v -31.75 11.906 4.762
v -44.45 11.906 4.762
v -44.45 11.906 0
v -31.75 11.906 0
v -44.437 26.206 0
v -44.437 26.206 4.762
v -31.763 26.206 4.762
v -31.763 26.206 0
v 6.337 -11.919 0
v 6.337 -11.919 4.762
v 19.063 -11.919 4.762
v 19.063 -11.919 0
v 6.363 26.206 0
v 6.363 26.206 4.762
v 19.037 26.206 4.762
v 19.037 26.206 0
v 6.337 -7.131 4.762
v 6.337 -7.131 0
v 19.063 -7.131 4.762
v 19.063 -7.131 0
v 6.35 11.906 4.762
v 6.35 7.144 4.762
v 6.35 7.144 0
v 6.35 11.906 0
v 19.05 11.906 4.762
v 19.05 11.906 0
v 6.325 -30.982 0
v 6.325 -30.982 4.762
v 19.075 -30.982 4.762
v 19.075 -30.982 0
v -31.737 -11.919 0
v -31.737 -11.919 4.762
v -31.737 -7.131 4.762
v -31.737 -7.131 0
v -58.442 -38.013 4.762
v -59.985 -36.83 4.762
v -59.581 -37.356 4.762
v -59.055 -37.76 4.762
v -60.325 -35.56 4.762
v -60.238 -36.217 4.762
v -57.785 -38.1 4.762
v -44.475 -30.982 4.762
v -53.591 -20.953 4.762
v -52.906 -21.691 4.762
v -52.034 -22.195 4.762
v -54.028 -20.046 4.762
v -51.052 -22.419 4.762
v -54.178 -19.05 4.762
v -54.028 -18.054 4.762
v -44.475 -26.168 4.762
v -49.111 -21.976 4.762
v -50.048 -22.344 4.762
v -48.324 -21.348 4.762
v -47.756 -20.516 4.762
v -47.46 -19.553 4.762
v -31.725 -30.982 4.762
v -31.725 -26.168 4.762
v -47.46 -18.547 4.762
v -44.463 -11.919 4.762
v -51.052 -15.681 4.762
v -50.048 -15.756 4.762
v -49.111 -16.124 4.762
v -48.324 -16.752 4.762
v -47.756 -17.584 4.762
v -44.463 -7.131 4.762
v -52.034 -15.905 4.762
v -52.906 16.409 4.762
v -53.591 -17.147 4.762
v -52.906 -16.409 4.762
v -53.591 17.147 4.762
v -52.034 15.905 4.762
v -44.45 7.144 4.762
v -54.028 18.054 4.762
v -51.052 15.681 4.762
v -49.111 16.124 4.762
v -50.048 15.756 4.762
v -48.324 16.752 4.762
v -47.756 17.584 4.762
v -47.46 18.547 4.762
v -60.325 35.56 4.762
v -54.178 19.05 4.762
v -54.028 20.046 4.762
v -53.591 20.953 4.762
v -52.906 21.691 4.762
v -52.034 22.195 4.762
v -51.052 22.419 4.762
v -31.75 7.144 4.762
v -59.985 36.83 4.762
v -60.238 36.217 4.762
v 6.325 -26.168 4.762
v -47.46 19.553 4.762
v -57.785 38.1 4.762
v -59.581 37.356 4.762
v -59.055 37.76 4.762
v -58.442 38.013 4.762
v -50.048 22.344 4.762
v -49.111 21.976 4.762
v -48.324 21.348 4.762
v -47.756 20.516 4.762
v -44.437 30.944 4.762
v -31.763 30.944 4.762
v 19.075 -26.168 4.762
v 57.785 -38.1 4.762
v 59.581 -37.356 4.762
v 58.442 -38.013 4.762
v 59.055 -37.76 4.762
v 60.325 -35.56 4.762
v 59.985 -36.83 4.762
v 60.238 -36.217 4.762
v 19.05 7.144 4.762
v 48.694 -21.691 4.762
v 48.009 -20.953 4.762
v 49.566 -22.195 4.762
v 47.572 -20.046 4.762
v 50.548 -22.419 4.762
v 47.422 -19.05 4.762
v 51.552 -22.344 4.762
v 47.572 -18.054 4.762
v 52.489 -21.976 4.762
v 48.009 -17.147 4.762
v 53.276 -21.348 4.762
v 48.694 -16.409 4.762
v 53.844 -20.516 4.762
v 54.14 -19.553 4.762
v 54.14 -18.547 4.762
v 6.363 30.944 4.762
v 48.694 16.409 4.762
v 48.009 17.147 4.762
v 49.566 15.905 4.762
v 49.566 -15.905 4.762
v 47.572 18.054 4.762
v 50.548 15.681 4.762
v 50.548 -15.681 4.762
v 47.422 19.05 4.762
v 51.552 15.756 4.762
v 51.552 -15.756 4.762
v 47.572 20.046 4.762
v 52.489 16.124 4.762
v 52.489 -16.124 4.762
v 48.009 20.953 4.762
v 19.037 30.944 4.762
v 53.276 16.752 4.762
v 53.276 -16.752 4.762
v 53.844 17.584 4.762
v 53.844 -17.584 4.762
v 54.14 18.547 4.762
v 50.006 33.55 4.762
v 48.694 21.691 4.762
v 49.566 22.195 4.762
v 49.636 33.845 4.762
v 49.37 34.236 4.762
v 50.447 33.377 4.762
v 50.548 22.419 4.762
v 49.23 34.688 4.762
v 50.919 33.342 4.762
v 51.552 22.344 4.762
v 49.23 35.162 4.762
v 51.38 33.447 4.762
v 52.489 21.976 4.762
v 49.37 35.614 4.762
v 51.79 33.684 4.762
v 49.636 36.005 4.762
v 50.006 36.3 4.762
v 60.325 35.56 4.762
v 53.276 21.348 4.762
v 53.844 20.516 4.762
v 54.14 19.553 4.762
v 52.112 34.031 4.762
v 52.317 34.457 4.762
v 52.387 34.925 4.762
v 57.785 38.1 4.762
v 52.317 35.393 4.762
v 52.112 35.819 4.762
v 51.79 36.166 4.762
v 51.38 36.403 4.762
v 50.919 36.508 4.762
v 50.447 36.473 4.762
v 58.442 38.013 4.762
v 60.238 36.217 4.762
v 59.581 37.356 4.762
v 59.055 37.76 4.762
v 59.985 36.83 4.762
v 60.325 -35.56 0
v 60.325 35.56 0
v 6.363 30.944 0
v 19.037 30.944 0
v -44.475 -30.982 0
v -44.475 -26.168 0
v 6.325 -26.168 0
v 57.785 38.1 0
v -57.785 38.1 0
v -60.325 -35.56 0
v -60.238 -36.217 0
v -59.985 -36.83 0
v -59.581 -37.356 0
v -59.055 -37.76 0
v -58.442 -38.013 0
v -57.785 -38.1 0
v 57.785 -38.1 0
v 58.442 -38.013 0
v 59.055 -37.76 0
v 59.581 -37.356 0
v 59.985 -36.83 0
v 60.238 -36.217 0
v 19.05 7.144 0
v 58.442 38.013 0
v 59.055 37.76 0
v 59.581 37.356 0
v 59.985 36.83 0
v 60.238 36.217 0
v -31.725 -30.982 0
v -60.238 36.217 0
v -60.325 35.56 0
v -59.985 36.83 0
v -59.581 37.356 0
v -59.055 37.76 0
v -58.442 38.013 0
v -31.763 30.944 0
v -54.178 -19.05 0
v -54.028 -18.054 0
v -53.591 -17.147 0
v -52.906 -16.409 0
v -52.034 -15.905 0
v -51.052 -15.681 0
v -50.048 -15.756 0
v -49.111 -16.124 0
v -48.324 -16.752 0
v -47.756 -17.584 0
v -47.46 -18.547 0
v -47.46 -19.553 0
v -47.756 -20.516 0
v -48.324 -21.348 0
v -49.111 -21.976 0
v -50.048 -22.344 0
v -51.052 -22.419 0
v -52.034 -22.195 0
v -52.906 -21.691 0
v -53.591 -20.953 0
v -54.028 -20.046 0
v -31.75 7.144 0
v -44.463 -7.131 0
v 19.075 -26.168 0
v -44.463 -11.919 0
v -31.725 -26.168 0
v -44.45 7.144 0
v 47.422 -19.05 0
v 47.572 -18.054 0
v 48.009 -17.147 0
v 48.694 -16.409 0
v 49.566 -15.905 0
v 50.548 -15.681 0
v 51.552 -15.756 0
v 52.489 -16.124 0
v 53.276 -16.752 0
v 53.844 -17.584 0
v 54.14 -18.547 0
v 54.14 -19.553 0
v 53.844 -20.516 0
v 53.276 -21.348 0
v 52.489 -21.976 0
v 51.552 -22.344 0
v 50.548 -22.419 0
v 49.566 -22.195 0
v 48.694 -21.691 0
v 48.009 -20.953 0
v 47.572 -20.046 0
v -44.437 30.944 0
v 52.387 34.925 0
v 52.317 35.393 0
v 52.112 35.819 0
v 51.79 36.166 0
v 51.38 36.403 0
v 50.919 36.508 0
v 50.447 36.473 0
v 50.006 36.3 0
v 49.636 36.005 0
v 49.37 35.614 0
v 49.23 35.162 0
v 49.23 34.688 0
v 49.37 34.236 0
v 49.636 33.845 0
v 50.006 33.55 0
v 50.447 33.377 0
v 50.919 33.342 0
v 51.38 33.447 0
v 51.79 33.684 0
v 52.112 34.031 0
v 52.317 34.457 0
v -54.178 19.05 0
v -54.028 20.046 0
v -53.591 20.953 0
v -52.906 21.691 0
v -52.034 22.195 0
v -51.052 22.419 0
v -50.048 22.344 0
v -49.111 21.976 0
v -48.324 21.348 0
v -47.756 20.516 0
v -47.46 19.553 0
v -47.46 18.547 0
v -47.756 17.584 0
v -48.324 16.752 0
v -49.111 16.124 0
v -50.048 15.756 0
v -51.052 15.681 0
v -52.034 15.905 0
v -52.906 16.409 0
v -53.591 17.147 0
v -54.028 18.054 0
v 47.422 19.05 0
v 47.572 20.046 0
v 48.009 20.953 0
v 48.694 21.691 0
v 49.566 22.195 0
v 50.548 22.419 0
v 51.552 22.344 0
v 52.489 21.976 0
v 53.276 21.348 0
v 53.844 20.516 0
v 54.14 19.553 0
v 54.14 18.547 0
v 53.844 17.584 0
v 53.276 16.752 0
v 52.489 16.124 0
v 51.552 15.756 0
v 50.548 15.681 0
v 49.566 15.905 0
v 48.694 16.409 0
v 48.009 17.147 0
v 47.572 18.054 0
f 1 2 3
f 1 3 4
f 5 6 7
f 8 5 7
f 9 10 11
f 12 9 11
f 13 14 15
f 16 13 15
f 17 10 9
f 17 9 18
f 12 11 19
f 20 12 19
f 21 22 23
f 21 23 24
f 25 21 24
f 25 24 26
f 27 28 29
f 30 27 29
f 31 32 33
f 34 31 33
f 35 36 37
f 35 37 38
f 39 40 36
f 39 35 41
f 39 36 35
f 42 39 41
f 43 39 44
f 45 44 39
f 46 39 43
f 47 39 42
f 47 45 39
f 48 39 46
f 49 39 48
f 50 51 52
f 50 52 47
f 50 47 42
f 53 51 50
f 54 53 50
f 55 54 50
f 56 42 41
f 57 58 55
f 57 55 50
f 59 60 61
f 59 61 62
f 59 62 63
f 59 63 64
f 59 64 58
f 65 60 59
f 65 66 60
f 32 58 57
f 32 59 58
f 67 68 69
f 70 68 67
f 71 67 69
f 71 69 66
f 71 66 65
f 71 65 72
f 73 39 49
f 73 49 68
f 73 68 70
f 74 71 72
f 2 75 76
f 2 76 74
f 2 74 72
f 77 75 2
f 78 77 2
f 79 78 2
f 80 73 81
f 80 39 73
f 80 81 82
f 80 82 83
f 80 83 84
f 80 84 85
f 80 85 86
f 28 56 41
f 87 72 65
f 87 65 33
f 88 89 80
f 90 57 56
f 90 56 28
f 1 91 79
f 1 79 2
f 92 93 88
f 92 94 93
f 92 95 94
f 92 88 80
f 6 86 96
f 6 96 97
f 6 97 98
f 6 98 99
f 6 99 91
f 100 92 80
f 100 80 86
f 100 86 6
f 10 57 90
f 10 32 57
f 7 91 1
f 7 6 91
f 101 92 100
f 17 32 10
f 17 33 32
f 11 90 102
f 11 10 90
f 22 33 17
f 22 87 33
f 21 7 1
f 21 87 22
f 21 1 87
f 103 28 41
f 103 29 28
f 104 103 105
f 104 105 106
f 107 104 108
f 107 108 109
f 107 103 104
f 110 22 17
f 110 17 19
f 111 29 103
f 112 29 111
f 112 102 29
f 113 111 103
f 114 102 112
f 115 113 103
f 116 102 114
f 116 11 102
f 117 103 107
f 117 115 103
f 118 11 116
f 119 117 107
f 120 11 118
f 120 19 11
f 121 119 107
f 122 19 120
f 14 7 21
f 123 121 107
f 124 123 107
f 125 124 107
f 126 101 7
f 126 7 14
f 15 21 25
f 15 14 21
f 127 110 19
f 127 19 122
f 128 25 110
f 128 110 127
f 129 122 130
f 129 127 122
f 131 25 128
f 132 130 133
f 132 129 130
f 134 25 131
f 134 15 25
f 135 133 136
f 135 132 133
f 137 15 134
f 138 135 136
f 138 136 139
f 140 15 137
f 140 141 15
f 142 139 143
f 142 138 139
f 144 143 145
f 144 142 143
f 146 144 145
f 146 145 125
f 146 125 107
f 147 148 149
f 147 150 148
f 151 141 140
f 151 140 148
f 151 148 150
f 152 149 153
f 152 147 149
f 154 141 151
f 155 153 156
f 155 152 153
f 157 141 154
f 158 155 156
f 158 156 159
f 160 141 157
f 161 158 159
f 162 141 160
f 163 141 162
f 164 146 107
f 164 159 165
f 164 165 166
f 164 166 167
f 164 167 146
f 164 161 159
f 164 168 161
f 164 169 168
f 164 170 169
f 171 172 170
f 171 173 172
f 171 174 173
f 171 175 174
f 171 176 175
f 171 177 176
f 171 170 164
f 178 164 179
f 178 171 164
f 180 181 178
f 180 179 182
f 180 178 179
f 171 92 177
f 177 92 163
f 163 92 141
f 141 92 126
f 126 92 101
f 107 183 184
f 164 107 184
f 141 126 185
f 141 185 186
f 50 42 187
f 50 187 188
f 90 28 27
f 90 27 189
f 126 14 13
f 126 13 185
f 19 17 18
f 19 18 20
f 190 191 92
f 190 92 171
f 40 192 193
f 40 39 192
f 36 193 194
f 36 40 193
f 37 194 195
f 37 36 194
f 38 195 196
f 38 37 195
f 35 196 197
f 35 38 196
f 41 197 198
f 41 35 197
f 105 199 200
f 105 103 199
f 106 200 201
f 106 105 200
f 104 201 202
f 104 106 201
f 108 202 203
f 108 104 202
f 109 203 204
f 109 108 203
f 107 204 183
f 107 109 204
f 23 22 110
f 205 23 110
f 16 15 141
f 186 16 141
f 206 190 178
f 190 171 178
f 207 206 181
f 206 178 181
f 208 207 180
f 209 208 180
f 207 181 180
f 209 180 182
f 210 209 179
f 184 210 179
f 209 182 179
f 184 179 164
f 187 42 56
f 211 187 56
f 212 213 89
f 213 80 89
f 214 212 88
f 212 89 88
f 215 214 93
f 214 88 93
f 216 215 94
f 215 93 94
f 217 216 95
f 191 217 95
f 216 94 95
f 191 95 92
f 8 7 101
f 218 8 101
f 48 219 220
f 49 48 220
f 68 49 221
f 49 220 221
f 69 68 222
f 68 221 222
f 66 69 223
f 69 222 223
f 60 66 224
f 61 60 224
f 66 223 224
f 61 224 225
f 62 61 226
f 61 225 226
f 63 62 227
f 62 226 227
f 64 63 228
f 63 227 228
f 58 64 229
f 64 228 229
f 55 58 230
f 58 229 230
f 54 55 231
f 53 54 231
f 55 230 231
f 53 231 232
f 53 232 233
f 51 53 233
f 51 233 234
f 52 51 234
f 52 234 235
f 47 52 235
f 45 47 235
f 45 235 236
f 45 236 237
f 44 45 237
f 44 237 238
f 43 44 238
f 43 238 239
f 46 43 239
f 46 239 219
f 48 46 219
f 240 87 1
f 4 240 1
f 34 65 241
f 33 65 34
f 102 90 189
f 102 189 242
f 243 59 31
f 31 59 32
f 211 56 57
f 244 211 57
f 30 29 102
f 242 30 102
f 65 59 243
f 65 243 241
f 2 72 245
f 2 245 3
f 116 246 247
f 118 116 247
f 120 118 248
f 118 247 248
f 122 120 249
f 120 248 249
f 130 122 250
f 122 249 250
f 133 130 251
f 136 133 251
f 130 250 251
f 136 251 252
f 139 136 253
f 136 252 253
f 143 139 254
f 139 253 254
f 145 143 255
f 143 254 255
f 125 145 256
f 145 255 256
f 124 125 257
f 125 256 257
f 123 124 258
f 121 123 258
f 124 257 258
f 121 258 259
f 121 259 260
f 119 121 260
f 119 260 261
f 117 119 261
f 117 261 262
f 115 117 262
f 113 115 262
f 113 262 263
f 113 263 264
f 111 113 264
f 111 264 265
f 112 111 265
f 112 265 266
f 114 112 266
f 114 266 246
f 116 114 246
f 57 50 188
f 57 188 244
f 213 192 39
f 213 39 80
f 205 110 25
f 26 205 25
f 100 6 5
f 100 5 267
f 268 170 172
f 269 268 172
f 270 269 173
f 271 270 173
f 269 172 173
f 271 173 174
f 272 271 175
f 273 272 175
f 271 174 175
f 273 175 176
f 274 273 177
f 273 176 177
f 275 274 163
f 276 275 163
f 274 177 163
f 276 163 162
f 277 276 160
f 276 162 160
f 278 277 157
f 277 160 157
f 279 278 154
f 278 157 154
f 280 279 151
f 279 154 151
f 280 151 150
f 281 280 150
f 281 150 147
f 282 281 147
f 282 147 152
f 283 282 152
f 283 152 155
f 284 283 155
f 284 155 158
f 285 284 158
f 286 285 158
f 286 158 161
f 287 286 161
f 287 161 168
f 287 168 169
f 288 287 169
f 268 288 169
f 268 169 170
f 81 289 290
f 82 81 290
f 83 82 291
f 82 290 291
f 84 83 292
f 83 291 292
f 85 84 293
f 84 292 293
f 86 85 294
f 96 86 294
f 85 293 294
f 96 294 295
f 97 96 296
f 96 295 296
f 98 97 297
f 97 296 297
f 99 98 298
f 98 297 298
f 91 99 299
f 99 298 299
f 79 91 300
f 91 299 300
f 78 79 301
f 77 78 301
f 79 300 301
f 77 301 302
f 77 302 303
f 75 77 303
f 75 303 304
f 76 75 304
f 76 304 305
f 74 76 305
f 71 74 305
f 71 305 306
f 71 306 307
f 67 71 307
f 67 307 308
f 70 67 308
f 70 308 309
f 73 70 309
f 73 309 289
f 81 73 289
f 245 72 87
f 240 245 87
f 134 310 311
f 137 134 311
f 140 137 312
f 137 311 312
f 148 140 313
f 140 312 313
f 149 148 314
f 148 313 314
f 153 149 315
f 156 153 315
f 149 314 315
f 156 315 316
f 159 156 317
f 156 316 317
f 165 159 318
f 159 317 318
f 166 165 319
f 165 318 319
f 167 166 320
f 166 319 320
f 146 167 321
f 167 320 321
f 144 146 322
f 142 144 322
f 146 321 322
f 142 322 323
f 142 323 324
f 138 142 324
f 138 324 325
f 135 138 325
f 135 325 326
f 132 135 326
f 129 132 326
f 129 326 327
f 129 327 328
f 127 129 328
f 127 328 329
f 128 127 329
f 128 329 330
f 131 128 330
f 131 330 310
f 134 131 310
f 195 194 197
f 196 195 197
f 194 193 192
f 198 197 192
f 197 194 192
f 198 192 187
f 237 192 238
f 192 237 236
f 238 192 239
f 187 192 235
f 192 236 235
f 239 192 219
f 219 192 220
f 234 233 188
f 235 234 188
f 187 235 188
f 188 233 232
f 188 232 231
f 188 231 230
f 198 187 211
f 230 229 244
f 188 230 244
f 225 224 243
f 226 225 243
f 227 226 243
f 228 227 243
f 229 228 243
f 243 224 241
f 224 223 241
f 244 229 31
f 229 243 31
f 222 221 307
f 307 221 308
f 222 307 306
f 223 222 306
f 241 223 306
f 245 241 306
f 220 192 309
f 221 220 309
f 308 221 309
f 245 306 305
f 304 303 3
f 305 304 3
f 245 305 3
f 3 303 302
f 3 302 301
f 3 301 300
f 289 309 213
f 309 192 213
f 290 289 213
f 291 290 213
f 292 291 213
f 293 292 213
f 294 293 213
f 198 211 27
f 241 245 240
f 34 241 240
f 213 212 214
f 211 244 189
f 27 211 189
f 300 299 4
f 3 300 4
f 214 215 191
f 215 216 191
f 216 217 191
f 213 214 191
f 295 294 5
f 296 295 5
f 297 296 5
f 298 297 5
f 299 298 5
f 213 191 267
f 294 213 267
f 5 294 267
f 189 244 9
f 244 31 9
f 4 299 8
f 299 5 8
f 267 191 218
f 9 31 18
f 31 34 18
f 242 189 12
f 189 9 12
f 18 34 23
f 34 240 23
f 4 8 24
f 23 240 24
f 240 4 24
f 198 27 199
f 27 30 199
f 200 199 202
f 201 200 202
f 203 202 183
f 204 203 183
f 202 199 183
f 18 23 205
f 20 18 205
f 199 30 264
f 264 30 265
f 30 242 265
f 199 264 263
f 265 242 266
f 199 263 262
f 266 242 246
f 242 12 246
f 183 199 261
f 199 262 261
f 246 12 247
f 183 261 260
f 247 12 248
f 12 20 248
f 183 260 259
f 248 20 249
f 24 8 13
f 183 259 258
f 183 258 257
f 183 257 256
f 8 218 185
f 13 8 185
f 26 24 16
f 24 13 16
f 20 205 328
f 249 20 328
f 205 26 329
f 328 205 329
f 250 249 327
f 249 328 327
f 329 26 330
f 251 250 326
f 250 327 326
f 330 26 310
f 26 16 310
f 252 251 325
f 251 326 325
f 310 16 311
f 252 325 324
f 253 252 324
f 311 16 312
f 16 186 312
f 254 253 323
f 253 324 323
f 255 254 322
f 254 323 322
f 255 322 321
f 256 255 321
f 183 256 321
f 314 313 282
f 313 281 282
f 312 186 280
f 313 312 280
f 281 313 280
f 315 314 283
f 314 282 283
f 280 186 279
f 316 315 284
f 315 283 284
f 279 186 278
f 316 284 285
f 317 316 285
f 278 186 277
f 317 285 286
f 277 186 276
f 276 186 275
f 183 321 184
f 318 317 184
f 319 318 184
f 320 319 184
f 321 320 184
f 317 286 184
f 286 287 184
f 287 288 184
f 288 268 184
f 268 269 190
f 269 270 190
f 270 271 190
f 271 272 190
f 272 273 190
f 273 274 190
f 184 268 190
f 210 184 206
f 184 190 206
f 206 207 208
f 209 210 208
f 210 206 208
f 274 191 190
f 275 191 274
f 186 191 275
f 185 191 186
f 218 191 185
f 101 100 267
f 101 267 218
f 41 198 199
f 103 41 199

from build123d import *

# Parameters (mm, degrees)
SKETCH1_W                   = 120.65
SKETCH1_H                   = 76.2
BOSS_EXTRUDE1_DEPTH         = 4.7625
SKETCH2_W                   = 12.6746
SKETCH2_H                   = 4.7371
SKETCH2_W_2                 = 12.7
SKETCH2_H_2                 = 4.7625
SKETCH2_W_3                 = 12.7254
SKETCH2_H_3                 = 4.7879
SKETCH2_W_4                 = 12.7508
SKETCH2_H_4                 = 4.8133
CUT_EXTRUDE1_DEPTH          = 5.7625
F_1_4_CLEARANCE_HOLE1_D     = 6.7564
F_1_4_CLEARANCE_HOLE1_DEPTH = 25.4
F_1_4_CLEARANCE_HOLE1_TIP   = 2.029827343
SKETCH6_R                   = 1.5875
CUT_EXTRUDE2_DEPTH          = 5.7625
FILLET1_R                   = 2.54


with BuildPart() as part:
    # Sketch1 → Boss-Extrude1 (new body)
    with BuildSketch(Plane.XY):
        Rectangle(SKETCH1_W, SKETCH1_H)
    extrude(amount=BOSS_EXTRUDE1_DEPTH)

    # Sketch2 → Cut-Extrude1 (cut, through all)
    with BuildSketch(Plane.XY.offset(4.7625)):
        with Locations((-38.1, 28.575)):
            Rectangle(SKETCH2_W, SKETCH2_H)
        with Locations((12.7, 28.575)):
            Rectangle(SKETCH2_W, SKETCH2_H)
        with Locations((-38.1, 9.525)):
            Rectangle(SKETCH2_W_2, SKETCH2_H_2)
        with Locations((12.7, 9.525)):
            Rectangle(SKETCH2_W_2, SKETCH2_H_2)
        with Locations((-38.1, -9.525)):
            Rectangle(SKETCH2_W_3, SKETCH2_H_3)
        with Locations((12.7, -9.525)):
            Rectangle(SKETCH2_W_3, SKETCH2_H_3)
        with Locations((-38.1, -28.575)):
            Rectangle(SKETCH2_W_4, SKETCH2_H_4)
        with Locations((12.7, -28.575)):
            Rectangle(SKETCH2_W_4, SKETCH2_H_4)
    extrude(amount=-CUT_EXTRUDE1_DEPTH, mode=Mode.SUBTRACT)

    # 1/4 Clearance Hole1
    with Locations(Plane.XY.offset(4.7625)):
        with Locations((-50.8, 19.05), (50.8, 19.05), (-50.8, -19.05), (50.8, -19.05)):
            Hole(F_1_4_CLEARANCE_HOLE1_D / 2, depth=F_1_4_CLEARANCE_HOLE1_DEPTH)
            with Locations((0, 0, -(F_1_4_CLEARANCE_HOLE1_DEPTH + F_1_4_CLEARANCE_HOLE1_TIP / 2))):  # 118° drill point
                Cone(0, F_1_4_CLEARANCE_HOLE1_D / 2, F_1_4_CLEARANCE_HOLE1_TIP, mode=Mode.SUBTRACT)

    # Sketch6 → Cut-Extrude2 (cut, through all)
    with BuildSketch(Plane.XY.offset(4.7625)):
        with Locations((50.8, 34.925)):
            Circle(SKETCH6_R)
    extrude(amount=-CUT_EXTRUDE2_DEPTH, mode=Mode.SUBTRACT)

    # Fillet1
    fillet1_edges = [part.edges().sort_by_distance(p)[0] for p in [
        (-60.325, 38.1, 2.38125),
        (60.325, 38.1, 2.38125),
        (60.325, -38.1, 2.38125),
        (-60.325, -38.1, 2.38125),
    ]]
    fillet(fillet1_edges, radius=FILLET1_R)


solid = part.part
